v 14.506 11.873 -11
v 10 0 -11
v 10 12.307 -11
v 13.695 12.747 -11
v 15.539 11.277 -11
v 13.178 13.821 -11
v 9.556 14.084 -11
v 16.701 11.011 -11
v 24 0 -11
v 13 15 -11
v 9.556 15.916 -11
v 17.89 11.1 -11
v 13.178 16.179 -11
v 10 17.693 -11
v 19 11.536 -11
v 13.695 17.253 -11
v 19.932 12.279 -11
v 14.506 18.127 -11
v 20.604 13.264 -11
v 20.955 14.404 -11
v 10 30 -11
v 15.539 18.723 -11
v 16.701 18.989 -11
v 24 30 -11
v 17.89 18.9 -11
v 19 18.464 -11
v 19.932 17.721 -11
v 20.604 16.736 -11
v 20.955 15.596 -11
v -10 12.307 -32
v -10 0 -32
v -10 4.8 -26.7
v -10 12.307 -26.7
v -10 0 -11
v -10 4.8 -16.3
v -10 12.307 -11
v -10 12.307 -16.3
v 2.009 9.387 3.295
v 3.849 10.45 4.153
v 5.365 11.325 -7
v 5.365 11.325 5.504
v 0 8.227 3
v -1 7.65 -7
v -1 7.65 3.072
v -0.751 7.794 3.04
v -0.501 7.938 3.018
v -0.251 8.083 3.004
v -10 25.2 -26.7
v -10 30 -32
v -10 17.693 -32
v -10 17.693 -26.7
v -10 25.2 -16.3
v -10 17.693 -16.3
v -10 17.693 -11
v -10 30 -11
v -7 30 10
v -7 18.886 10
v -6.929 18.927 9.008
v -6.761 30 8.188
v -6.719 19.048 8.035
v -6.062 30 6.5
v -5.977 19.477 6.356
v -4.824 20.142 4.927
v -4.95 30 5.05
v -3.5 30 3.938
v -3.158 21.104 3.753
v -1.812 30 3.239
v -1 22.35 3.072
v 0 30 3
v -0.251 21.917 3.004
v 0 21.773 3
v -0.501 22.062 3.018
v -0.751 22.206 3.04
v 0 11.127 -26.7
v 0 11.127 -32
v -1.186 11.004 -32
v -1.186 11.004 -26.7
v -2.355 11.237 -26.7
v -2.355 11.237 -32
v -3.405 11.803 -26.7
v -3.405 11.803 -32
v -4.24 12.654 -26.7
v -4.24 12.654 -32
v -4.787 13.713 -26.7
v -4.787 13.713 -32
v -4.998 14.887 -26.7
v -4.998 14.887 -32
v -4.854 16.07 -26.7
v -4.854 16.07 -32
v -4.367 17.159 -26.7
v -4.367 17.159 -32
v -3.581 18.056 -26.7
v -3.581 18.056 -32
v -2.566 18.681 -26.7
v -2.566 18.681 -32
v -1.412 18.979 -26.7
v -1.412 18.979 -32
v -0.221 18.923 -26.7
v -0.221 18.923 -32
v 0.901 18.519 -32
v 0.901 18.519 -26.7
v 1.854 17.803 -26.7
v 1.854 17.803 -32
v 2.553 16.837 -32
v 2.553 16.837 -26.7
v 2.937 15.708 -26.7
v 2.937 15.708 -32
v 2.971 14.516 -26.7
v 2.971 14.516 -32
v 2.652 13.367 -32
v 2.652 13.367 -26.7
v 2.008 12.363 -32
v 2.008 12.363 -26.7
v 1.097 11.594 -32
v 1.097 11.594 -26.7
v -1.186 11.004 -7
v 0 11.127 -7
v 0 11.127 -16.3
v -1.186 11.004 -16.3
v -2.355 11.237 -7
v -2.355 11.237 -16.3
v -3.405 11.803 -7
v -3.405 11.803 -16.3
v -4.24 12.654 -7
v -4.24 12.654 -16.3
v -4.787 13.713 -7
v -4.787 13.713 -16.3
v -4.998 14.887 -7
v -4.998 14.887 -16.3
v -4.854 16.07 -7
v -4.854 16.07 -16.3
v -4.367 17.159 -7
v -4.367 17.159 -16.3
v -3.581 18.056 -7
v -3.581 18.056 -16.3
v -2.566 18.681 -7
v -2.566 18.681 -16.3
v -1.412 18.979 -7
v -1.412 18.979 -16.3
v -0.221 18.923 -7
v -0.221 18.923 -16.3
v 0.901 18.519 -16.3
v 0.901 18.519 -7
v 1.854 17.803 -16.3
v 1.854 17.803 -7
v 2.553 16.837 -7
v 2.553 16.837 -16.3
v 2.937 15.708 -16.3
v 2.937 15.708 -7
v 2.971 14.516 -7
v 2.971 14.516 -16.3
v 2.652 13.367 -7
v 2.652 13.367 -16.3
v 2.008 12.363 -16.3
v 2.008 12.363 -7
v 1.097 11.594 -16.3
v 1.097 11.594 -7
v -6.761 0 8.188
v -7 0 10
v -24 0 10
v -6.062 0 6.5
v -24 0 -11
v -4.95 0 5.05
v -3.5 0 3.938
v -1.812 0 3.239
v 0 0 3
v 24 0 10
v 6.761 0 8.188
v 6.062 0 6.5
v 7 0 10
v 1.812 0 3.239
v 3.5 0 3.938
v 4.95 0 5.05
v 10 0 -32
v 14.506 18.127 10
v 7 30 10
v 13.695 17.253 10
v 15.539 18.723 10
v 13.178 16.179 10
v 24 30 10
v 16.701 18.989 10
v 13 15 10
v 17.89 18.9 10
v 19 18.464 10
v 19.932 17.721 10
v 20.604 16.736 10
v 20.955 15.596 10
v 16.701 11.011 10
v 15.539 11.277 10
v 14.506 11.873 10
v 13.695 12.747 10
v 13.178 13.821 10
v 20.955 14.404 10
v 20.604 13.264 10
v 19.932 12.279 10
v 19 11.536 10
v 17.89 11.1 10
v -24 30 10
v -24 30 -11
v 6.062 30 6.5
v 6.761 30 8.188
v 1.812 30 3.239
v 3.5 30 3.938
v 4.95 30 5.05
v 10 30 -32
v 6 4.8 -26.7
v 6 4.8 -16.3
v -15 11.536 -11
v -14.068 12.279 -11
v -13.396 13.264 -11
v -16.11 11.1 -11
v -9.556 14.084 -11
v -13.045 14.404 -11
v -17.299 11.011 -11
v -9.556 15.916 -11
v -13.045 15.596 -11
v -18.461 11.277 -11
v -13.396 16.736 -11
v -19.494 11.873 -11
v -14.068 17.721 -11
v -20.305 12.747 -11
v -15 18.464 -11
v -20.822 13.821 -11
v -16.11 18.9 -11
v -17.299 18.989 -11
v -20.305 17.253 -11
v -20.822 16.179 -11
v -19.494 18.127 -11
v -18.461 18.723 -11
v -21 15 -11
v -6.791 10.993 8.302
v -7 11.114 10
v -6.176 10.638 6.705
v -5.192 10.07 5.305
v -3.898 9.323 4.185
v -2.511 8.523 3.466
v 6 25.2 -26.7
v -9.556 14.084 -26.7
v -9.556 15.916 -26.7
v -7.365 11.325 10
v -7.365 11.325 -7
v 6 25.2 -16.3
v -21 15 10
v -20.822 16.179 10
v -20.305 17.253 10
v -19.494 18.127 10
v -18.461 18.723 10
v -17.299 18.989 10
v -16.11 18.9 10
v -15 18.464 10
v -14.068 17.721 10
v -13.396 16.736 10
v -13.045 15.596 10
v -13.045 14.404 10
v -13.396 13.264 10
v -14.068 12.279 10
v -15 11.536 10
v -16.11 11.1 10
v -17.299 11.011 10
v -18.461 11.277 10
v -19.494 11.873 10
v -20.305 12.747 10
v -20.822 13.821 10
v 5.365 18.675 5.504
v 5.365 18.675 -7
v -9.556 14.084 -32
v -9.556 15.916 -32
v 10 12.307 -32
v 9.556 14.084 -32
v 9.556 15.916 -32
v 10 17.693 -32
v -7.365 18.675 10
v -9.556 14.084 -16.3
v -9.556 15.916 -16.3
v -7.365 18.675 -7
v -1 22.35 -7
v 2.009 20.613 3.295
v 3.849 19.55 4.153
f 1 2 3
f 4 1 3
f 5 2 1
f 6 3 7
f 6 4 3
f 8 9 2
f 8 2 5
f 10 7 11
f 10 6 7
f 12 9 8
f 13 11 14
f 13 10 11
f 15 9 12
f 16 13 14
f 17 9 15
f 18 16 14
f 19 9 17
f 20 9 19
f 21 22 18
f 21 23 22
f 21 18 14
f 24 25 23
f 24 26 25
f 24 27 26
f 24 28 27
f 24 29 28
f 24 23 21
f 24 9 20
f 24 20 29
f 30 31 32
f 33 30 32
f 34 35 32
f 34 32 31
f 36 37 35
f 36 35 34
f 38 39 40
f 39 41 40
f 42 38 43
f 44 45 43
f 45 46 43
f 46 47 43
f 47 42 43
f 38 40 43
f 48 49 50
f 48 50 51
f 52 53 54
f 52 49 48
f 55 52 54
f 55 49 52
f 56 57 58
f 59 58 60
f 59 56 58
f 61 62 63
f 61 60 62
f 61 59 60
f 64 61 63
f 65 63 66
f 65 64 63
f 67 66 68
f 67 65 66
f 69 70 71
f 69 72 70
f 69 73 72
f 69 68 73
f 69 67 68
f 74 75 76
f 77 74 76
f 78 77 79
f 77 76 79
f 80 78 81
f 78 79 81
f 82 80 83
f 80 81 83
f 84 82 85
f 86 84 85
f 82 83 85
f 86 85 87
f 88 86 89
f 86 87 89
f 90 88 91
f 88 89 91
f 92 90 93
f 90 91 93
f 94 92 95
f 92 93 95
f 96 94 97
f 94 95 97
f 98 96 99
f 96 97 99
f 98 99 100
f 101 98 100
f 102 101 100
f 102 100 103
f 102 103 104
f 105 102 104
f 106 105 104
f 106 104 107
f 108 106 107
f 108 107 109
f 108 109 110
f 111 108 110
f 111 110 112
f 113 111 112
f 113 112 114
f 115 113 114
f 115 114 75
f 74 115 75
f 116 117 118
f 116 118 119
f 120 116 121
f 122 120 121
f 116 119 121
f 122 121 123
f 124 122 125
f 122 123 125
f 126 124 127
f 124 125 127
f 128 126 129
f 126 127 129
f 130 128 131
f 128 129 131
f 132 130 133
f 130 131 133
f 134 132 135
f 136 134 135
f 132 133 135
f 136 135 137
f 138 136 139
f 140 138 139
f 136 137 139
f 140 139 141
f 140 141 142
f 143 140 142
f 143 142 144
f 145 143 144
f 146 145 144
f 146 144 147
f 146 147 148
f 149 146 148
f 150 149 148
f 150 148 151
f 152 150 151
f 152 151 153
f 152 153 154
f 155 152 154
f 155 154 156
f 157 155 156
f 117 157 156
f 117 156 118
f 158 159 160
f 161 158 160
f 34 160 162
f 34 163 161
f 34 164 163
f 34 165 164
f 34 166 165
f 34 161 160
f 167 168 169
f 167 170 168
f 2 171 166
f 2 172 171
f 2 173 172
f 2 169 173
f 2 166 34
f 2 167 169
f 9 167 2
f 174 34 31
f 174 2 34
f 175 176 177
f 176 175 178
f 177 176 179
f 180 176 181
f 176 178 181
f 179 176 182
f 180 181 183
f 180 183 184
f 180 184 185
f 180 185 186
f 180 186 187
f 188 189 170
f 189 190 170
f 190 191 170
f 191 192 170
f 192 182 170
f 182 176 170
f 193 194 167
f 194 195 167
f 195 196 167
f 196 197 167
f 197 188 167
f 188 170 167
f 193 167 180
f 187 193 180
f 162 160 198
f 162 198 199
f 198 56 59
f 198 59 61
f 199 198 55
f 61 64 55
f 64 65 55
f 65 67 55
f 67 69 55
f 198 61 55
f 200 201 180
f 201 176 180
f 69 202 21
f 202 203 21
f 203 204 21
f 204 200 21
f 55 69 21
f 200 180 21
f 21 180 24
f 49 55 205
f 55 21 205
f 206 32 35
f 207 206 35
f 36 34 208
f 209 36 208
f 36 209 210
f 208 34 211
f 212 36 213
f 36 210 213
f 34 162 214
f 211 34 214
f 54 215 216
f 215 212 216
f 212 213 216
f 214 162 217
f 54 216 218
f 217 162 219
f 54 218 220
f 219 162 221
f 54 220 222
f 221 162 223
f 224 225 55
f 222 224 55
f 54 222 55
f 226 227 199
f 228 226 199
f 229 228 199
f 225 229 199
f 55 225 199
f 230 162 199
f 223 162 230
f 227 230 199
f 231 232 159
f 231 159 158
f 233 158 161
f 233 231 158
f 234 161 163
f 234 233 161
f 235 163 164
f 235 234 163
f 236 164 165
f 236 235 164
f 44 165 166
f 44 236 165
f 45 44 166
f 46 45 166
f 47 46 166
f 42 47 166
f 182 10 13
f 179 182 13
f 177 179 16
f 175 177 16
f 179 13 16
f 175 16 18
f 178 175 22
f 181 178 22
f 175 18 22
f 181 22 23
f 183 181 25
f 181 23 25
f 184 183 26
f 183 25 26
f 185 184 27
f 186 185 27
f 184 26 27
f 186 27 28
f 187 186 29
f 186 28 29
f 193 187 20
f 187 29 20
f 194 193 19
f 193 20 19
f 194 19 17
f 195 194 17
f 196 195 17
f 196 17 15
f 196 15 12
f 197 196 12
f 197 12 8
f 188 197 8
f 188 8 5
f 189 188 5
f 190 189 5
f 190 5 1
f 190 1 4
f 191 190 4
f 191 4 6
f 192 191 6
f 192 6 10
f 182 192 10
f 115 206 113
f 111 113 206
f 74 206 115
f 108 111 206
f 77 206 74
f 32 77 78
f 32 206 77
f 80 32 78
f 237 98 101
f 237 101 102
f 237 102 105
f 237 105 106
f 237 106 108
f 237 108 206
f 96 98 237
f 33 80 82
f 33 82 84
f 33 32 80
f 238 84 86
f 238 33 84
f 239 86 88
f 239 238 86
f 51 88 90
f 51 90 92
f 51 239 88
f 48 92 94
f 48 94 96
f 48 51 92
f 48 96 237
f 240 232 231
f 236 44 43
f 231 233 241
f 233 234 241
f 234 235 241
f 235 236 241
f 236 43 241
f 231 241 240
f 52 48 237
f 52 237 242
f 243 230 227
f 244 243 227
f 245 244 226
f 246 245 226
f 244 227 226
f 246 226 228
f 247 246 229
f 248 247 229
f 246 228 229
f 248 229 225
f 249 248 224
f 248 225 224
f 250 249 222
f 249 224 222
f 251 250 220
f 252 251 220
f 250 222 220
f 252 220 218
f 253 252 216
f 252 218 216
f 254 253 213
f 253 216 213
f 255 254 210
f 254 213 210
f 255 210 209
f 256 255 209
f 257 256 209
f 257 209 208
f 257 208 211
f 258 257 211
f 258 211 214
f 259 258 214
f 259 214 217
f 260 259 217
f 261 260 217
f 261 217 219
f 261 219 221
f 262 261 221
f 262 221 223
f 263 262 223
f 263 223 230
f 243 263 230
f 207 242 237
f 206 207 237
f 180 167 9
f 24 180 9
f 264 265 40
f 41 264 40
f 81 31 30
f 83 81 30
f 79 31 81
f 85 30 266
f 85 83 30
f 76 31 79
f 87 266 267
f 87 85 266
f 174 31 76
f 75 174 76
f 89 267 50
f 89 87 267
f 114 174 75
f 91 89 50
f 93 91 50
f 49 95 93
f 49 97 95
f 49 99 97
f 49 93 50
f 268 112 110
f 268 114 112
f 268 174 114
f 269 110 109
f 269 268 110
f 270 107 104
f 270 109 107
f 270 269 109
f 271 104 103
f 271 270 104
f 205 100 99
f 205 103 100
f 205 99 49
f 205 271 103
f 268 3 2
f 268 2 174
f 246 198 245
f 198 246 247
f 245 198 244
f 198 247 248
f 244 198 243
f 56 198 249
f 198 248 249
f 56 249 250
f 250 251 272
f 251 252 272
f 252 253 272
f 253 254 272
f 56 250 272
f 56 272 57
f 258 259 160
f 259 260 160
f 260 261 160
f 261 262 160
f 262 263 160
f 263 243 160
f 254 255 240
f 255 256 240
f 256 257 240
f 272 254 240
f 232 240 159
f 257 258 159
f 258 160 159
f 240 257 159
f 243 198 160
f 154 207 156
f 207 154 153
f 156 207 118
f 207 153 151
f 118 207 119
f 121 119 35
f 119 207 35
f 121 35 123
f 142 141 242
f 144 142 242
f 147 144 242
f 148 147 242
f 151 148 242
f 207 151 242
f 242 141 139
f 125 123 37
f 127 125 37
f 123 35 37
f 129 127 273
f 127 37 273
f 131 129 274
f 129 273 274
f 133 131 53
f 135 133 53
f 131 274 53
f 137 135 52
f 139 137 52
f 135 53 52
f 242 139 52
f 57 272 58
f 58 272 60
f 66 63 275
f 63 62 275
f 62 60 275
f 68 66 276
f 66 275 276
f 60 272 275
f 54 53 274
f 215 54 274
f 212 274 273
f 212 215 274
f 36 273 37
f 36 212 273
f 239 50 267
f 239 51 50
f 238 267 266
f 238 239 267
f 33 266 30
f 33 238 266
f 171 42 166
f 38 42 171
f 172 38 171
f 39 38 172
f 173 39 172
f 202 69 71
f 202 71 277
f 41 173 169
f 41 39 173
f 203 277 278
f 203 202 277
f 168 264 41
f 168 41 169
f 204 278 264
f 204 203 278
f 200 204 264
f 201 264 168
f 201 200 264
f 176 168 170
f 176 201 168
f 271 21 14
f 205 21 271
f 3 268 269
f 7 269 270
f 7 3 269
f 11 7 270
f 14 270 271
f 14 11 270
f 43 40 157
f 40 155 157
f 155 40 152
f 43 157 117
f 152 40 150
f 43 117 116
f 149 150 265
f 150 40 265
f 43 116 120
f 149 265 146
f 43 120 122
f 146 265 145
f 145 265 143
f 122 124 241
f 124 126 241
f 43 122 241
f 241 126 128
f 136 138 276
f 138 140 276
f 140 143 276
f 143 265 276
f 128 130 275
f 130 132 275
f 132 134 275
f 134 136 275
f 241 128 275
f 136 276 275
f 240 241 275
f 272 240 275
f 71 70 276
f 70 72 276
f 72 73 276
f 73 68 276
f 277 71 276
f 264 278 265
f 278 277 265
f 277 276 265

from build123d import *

# Parameters (mm, degrees)
SKETCH_1_W          = 48
SKETCH_1_H          = 20
EXTRUDE_1_DEPTH     = 30
SKETCH_2_W          = 14
SKETCH_2_H          = 30
CUT_EXTRUDE_1_DEPTH = 7
SKETCH_7_W          = 22
SKETCH_7_H          = 30
EXTRUDE_2_DEPTH     = 48
SKETCH_8_W          = 21
SKETCH_8_H          = 30
CUT_EXTRUDE_2_DEPTH = 14
SKETCH_9_W          = 21
SKETCH_9_H          = 30
CUT_EXTRUDE_3_DEPTH = 14
SKETCH_11_W         = 10.4
SKETCH_11_H         = 20.4
CUT_EXTRUDE_4_DEPTH = 56.497747702
SKETCH_13_R         = 4
CUT_EXTRUDE_5_DEPTH = 44.783558558
SKETCH_14_R         = 4
CUT_EXTRUDE_6_DEPTH = 44.783558558
FILLET_1_R          = 7
SKETCH1_W           = 10.4
SKETCH1_H           = 20.4
BOSS_EXTRUDE1_DEPTH = 4
SKETCH_20_R         = 7.5
CUT_EXTRUDE_8_DEPTH = 44.783558558
SKETCH3_R           = 4
CUT_EXTRUDE2_DEPTH  = 57.920997883
CUT_EXTRUDE3_START  = -25
CUT_EXTRUDE3_DEPTH  = 20


with BuildPart() as part:
    # Эскиз1 → Бобышка-Вытянуть1 (new body)
    with BuildSketch(Plane(origin=(0, 0, 0), x_dir=(1, 0, 0), z_dir=(0, 1, 0))):
        Rectangle(SKETCH_1_W, SKETCH_1_H)
    extrude(amount=EXTRUDE_1_DEPTH)

    # Эскиз2 → Вырез-Вытянуть1 (cut)
    with BuildSketch(Plane.XY.offset(10)):
        with Locations((0, 15)):
            Rectangle(SKETCH_2_W, SKETCH_2_H)
    extrude(amount=-CUT_EXTRUDE_1_DEPTH, mode=Mode.SUBTRACT)

    # Эскиз7 → Бобышка-Вытянуть2 (add)
    with BuildSketch(Plane(origin=(24, 0, 0), x_dir=(0, 0, -1), z_dir=(1, 0, 0))):
        with Locations((21, 15)):
            Rectangle(SKETCH_7_W, SKETCH_7_H)
    extrude(amount=-EXTRUDE_2_DEPTH)

    # Эскиз8 → Вырез-Вытянуть2 (cut)
    with BuildSketch(Plane(origin=(24, 0, 0), x_dir=(0, 0, -1), z_dir=(1, 0, 0))):
        with Locations((21.5, 15)):
            Rectangle(SKETCH_8_W, SKETCH_8_H)
    extrude(amount=-CUT_EXTRUDE_2_DEPTH, mode=Mode.SUBTRACT)

    # Эскиз9 → Вырез-Вытянуть3 (cut)
    with BuildSketch(Plane.ZY.offset(24)):
        with Locations((-21.5, 15)):
            Rectangle(SKETCH_9_W, SKETCH_9_H)
    extrude(amount=-CUT_EXTRUDE_3_DEPTH, mode=Mode.SUBTRACT)

    # Эскиз11 → Вырез-Вытянуть4 (cut, through all)
    with BuildSketch(Plane.ZY.offset(10)):
        with Locations((-21.5, 15)):
            Rectangle(SKETCH_11_W, SKETCH_11_H)
    extrude(amount=-CUT_EXTRUDE_4_DEPTH, mode=Mode.SUBTRACT)

    # Эскиз13 → Вырез-Вытянуть5 (cut, through all)
    with BuildSketch(Plane(origin=(0, 0, -11), x_dir=(-1, 0, 0), z_dir=(0, 0, -1))):
        with Locations((17, 15)):
            Circle(SKETCH_13_R)
    extrude(amount=-CUT_EXTRUDE_5_DEPTH, mode=Mode.SUBTRACT)

    # Эскиз14 → Вырез-Вытянуть6 (cut, through all)
    with BuildSketch(Plane(origin=(0, 0, -11), x_dir=(-1, 0, 0), z_dir=(0, 0, -1))):
        with Locations((-17, 15)):
            Circle(SKETCH_14_R)
    extrude(amount=-CUT_EXTRUDE_6_DEPTH, mode=Mode.SUBTRACT)

    # Скругление1
    fillet_1_edges = [part.edges().sort_by_distance(p)[0] for p in [
        (-7, 15, 3),
        (7, 15, 3),
    ]]
    fillet(fillet_1_edges, radius=FILLET_1_R - 0.0001)  # a hair under: the kernel refuses the full size

    # Sketch1 → Boss-Extrude1 (add)
    with BuildSketch(Plane(origin=(10, 0, 0), x_dir=(0, 0, -1), z_dir=(1, 0, 0))):
        with Locations((21.5, 15)):
            Rectangle(SKETCH1_W, SKETCH1_H)
    extrude(amount=-BOSS_EXTRUDE1_DEPTH)

    # Эскиз20 → Вырез-Вытянуть8 (cut, through all)
    with BuildSketch(Plane(origin=(0, 0, -11), x_dir=(-1, 0, 0), z_dir=(0, 0, -1))):
        with Locations((-17, 15)):
            Circle(SKETCH_20_R)
        with Locations((17, 15)):
            Circle(SKETCH_20_R)
    extrude(amount=CUT_EXTRUDE_8_DEPTH, mode=Mode.SUBTRACT)

    # Sketch3 → Cut-Extrude2 (cut, through all)
    with BuildSketch(Plane(origin=(0, 0, -32), x_dir=(-1, 0, 0), z_dir=(0, 0, -1))):
        with Locations(Location((1, 15, 0), (0, 0, 255.522487814))):
            Circle(SKETCH3_R)
    extrude(amount=-CUT_EXTRUDE2_DEPTH, mode=Mode.SUBTRACT)

    # Sketch4 → Cut-Extrude3 (cut)
    with BuildSketch(Plane(origin=(0, 0, -32), x_dir=(-1, 0, 0), z_dir=(0, 0, -1)).offset(CUT_EXTRUDE3_START)):
        Polygon((1, 22.35), (-5.365286718, 18.675), (-5.365286718, 11.325), (1, 7.65), (7.365286718, 11.325), (7.365286718, 18.675), align=None)
    extrude(amount=-CUT_EXTRUDE3_DEPTH, mode=Mode.SUBTRACT)


solid = part.part
